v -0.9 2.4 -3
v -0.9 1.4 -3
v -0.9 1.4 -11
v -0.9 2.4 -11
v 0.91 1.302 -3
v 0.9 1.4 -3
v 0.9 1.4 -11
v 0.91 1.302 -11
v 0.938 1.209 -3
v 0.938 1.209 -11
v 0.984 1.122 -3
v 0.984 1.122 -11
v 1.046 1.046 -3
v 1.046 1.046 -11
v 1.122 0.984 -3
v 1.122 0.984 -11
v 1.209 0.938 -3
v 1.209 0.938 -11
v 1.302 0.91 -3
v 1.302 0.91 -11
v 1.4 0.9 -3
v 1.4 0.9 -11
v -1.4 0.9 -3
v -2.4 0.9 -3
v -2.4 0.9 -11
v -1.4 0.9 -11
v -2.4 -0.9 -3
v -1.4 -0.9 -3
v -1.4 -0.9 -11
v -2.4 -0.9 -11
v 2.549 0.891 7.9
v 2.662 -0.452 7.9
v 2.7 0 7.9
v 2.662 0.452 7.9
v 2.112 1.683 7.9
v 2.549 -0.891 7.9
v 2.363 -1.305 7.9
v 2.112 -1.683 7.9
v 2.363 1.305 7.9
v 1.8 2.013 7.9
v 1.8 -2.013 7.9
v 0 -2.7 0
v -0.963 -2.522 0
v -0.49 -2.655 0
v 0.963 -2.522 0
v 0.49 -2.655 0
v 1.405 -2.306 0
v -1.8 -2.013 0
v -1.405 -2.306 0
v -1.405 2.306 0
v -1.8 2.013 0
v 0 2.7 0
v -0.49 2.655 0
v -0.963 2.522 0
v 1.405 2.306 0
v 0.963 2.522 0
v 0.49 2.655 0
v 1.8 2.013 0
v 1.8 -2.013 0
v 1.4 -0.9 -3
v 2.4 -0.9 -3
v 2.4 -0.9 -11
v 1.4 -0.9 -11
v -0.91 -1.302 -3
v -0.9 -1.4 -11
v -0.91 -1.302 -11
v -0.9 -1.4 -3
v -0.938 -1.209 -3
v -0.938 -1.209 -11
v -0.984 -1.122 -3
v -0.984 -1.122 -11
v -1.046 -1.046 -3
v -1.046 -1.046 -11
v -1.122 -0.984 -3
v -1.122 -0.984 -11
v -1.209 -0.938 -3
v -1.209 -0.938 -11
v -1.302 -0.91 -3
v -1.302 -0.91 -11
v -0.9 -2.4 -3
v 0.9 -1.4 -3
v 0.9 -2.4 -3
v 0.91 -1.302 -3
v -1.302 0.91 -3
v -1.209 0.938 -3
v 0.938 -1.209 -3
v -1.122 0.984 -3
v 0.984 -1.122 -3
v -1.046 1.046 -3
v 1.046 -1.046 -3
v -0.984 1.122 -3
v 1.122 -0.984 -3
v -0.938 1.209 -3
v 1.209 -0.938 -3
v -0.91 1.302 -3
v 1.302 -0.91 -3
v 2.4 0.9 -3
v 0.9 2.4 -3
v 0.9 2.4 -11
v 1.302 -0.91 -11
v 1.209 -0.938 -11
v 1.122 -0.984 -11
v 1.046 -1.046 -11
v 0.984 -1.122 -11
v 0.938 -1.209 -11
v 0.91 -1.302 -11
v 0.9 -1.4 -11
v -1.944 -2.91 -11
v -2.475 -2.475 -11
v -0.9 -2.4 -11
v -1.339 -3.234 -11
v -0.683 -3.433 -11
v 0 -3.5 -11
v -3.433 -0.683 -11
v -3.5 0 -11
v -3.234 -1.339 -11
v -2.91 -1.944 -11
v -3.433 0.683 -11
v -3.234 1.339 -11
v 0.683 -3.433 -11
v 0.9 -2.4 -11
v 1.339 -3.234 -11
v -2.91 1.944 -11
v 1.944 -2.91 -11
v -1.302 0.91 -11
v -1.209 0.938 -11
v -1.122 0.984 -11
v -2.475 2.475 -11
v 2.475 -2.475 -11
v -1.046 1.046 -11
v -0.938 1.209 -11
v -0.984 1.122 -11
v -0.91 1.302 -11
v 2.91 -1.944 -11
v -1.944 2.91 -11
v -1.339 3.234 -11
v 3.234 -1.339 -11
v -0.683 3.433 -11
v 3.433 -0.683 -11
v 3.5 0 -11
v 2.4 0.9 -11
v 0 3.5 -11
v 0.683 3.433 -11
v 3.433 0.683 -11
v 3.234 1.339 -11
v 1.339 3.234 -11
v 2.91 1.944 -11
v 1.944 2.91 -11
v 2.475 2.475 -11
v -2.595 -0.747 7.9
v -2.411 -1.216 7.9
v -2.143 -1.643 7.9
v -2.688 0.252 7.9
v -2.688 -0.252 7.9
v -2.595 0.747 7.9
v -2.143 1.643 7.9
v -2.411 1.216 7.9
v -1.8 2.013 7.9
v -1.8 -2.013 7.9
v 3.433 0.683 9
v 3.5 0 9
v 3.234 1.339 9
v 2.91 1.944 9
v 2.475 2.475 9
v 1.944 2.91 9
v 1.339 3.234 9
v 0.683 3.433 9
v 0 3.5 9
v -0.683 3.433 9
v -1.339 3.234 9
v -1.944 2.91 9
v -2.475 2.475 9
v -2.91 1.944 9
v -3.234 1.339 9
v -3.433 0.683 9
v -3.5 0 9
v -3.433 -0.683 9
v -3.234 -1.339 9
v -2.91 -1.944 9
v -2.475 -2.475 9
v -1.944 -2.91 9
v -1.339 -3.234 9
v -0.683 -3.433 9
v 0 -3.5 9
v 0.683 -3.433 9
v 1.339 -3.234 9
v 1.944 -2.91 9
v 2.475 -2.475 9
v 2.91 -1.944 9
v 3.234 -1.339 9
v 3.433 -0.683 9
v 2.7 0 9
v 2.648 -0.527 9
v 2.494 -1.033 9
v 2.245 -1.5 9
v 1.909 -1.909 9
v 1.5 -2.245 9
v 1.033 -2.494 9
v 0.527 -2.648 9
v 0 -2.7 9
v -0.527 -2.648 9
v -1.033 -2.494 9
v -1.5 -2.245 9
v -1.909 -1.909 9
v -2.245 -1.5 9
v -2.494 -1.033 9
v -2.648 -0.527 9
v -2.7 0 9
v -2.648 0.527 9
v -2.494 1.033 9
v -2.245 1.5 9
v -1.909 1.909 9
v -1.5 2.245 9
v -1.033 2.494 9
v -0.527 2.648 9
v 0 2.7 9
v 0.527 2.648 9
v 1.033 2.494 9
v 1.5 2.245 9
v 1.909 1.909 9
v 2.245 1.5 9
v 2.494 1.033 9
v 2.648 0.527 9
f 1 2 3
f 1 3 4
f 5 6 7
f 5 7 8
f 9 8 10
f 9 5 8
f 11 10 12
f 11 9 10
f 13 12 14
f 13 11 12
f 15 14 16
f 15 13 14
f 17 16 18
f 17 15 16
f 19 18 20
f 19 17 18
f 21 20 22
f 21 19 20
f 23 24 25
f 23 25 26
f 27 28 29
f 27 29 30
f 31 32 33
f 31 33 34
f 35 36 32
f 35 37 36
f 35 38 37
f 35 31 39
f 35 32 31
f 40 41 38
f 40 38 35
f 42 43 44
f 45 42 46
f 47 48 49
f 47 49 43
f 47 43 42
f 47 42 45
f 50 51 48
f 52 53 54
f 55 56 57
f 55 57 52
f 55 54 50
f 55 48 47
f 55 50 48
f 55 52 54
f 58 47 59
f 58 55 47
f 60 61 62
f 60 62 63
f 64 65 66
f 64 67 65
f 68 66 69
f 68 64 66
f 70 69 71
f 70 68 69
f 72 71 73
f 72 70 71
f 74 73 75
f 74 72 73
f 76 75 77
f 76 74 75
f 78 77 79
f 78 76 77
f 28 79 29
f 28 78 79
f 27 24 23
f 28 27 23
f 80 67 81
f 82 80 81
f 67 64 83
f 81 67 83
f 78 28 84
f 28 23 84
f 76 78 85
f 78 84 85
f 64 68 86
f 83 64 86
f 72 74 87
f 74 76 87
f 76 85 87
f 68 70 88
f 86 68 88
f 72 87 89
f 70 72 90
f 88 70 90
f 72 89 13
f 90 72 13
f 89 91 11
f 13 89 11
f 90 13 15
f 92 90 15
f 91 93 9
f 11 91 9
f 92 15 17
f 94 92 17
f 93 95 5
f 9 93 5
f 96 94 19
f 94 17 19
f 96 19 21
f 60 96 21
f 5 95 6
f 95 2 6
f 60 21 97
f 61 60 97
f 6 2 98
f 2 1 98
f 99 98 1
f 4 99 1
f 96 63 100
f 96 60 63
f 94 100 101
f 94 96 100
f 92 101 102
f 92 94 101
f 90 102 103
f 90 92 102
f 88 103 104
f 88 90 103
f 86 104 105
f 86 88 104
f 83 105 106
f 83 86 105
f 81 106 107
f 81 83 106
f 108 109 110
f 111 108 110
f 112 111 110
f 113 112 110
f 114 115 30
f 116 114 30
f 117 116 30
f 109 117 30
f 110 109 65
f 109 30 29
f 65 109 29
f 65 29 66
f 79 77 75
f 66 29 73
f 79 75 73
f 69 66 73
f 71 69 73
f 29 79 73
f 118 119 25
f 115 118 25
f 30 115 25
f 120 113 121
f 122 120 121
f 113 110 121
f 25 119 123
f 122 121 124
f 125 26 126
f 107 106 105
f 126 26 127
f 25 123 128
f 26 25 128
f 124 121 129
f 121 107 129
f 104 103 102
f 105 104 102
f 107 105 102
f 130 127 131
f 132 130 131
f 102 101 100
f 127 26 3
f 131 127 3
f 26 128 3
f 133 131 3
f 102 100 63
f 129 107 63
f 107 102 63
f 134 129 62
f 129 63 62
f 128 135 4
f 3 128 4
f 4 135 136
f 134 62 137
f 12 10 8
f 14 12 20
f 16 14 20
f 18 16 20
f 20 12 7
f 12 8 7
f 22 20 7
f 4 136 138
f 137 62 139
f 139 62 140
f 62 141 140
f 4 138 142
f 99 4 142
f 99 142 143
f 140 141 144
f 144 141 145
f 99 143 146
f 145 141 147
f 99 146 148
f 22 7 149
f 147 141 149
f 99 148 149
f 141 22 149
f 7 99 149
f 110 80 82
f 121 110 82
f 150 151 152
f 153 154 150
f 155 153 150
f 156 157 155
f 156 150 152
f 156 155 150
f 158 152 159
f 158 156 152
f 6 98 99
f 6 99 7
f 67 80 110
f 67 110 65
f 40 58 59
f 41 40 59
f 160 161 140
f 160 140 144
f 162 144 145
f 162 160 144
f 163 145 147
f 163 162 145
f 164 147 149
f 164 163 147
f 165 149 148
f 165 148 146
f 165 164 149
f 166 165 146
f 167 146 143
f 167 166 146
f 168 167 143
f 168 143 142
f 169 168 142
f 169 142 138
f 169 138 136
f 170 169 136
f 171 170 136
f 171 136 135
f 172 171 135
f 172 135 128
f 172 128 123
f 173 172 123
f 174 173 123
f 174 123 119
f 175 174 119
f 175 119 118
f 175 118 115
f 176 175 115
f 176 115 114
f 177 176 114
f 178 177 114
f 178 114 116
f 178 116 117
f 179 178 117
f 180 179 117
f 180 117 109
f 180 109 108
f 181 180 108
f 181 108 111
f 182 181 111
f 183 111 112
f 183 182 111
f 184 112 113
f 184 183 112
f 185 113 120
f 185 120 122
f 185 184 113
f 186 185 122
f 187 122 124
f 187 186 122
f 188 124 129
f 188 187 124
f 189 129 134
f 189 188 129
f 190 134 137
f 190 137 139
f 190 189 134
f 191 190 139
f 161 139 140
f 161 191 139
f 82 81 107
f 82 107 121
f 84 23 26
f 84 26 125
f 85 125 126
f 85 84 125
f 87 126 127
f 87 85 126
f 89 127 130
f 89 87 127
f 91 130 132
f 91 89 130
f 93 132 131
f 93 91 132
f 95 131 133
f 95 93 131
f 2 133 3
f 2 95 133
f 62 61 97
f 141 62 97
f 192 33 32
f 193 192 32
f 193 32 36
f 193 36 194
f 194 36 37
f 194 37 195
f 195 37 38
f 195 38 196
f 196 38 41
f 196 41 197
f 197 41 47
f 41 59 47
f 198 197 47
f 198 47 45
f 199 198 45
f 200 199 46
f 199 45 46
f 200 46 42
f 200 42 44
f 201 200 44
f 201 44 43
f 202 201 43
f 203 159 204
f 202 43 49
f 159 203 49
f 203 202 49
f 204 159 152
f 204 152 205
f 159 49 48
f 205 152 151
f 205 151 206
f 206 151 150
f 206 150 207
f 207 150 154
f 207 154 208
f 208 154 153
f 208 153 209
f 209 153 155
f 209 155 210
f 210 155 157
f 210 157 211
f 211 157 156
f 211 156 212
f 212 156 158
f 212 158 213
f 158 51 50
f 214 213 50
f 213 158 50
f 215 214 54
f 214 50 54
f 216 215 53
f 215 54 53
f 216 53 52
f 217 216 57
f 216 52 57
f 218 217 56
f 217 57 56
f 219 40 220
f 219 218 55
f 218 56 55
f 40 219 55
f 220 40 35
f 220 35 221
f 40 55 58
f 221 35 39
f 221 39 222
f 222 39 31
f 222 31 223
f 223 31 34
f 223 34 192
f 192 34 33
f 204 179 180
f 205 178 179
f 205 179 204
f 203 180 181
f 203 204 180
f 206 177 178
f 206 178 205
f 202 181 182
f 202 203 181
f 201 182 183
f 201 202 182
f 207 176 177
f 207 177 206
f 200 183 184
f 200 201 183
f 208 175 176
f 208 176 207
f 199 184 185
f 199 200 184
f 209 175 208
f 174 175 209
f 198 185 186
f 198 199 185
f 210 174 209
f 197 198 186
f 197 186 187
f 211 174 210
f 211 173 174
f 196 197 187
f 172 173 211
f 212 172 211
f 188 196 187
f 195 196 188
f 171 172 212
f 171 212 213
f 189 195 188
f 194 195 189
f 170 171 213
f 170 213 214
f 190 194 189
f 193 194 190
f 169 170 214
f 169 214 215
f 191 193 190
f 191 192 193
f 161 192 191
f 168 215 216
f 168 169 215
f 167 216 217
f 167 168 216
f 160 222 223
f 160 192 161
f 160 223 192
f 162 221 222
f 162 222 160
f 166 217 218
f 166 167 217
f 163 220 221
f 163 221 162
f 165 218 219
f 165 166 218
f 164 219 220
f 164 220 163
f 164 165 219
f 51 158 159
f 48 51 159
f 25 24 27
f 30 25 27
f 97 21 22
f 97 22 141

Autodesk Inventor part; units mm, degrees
ref_plane "YZ Plane" through (0, 0, 0) normal (1, 0, 0) x (0, 1, 0)
ref_plane "XZ Plane" through (0, 0, 0) normal (0, 1, 0) x (-1, 0, 0)
ref_plane "XY Plane" through (0, 0, 0) normal (0, 0, 1) x (1, 0, 0)
sketch "Motor_Lego_Axle_Connector" plane through (0, 0, 0) normal (0, 0, 1) x (1, 0, 0)
  circle A0 centre (0, 0) radius 3.5
  circle A1 centre (0, 0) radius 2.7
  line L0 (-1.8, 2.0125) -> (-1.8, -2.0125)
  line L1 (0, 3.5) -> (0, -3.5) construction
  line L2 (1.8, 2.0125) -> (1.8, -2.0125)
  line L3 (0.9, 2.4) -> (-0.9, 2.4)
  line L4 (0.9, 2.4) -> (0.9, 1.4)
  line L5 (1.4, 1.4) -> (0.9, 1.4) construction
  line L6 (1.4, 1.4) -> (1.4, 0.9) construction
  arc A2 (0.9, 1.4) -> (1.4, 0.9) centre (1.4, 1.4) ccw
  line L7 (1.4, 0.9) -> (2.4, 0.9)
  line L8 (-0.9, 1.4) -> (-0.9, 2.4)
  arc A3 (-1.4, 0.9) -> (-0.9, 1.4) centre (-1.4, 1.4) ccw
  line L9 (-2.4, 0.9) -> (-1.4, 0.9)
  line L10 (-2.4, 0.9) -> (-2.4, -0.9)
  line L11 (-1.4, -0.9) -> (-2.4, -0.9)
  arc A4 (-0.9, -1.4) -> (-1.4, -0.9) centre (-1.4, -1.4) ccw
  line L12 (-0.9, -2.4) -> (-0.9, -1.4)
  line L13 (-0.9, -2.4) -> (0.9, -2.4)
  line L14 (0.9, -1.4) -> (0.9, -2.4)
  arc A5 (1.4, -0.9) -> (0.9, -1.4) centre (1.4, -1.4) ccw
  line L15 (2.4, -0.9) -> (1.4, -0.9)
  line L16 (2.4, -0.9) -> (2.4, 0.9)
  point P0 (1.8, -2.0125)
  point P1 (0, 2.4)
  point P2 (-2.4, 0)
  point P3 (0, -2.4)
  point P4 (2.4, 0)
  dimension "d0" = 7
  dimension "d1" = 5.4
  dimension "d2" = 7
  dimension "d3" = 1.8
  dimension "d12" = 1.8
  dimension "d13" = 2.4
  dimension "d14" = 1
  dimension "d16" = 0.5
  dimension "d17" = 1
  dimension "d20" = 360
extrude "Motor_Side_Outer_Ring_Extrusion" add sketch "Motor_Lego_Axle_Connector" along normal blind 9
extrude "Motor_Connector_Extrusion" add sketch "Motor_Lego_Axle_Connector" along normal blind 7.9 separate body contours A1 L2 L15 L16 L7 | L0 L9 L10 L11 A1 | L7 L16 L15 L2 | L0 L11 L10 L9
extrude "Seperation_Extrusion" add sketch "Motor_Lego_Axle_Connector" against normal blind 3 contours A1 L2 L15 L16 L7 | L2 L7 A2 L4 L3 L8 A3 L9 L0 A1 | A1 L0 L11 A4 L12 L13 L14 A5 L15 L2 | L0 L9 L10 L11 A1 | L7 L16 L15 L2 | L2 L15 A5 L14 L13 L12 A4 L11 L0 L9 A3 L8 L3 L4 A2 L7 | L0 L11 L10 L9
extrude "Lego_Axle_Side_Outer_Ring_Extrusion" add sketch "Motor_Lego_Axle_Connector" against normal blind 11
extrude "Lego_Axle_Connector_Extrusion" add sketch "Motor_Lego_Axle_Connector" against normal blind 11 contours A1 L2 L15 L16 L7 | L2 L7 A2 L4 L3 L8 A3 L9 L0 A1 | A1 L0 L11 A4 L12 L13 L14 A5 L15 L2 | L0 L9 L10 L11 A1
equation "\"d2\" = d0"
properties part number "Motor_Lego_Axle_Connector"
